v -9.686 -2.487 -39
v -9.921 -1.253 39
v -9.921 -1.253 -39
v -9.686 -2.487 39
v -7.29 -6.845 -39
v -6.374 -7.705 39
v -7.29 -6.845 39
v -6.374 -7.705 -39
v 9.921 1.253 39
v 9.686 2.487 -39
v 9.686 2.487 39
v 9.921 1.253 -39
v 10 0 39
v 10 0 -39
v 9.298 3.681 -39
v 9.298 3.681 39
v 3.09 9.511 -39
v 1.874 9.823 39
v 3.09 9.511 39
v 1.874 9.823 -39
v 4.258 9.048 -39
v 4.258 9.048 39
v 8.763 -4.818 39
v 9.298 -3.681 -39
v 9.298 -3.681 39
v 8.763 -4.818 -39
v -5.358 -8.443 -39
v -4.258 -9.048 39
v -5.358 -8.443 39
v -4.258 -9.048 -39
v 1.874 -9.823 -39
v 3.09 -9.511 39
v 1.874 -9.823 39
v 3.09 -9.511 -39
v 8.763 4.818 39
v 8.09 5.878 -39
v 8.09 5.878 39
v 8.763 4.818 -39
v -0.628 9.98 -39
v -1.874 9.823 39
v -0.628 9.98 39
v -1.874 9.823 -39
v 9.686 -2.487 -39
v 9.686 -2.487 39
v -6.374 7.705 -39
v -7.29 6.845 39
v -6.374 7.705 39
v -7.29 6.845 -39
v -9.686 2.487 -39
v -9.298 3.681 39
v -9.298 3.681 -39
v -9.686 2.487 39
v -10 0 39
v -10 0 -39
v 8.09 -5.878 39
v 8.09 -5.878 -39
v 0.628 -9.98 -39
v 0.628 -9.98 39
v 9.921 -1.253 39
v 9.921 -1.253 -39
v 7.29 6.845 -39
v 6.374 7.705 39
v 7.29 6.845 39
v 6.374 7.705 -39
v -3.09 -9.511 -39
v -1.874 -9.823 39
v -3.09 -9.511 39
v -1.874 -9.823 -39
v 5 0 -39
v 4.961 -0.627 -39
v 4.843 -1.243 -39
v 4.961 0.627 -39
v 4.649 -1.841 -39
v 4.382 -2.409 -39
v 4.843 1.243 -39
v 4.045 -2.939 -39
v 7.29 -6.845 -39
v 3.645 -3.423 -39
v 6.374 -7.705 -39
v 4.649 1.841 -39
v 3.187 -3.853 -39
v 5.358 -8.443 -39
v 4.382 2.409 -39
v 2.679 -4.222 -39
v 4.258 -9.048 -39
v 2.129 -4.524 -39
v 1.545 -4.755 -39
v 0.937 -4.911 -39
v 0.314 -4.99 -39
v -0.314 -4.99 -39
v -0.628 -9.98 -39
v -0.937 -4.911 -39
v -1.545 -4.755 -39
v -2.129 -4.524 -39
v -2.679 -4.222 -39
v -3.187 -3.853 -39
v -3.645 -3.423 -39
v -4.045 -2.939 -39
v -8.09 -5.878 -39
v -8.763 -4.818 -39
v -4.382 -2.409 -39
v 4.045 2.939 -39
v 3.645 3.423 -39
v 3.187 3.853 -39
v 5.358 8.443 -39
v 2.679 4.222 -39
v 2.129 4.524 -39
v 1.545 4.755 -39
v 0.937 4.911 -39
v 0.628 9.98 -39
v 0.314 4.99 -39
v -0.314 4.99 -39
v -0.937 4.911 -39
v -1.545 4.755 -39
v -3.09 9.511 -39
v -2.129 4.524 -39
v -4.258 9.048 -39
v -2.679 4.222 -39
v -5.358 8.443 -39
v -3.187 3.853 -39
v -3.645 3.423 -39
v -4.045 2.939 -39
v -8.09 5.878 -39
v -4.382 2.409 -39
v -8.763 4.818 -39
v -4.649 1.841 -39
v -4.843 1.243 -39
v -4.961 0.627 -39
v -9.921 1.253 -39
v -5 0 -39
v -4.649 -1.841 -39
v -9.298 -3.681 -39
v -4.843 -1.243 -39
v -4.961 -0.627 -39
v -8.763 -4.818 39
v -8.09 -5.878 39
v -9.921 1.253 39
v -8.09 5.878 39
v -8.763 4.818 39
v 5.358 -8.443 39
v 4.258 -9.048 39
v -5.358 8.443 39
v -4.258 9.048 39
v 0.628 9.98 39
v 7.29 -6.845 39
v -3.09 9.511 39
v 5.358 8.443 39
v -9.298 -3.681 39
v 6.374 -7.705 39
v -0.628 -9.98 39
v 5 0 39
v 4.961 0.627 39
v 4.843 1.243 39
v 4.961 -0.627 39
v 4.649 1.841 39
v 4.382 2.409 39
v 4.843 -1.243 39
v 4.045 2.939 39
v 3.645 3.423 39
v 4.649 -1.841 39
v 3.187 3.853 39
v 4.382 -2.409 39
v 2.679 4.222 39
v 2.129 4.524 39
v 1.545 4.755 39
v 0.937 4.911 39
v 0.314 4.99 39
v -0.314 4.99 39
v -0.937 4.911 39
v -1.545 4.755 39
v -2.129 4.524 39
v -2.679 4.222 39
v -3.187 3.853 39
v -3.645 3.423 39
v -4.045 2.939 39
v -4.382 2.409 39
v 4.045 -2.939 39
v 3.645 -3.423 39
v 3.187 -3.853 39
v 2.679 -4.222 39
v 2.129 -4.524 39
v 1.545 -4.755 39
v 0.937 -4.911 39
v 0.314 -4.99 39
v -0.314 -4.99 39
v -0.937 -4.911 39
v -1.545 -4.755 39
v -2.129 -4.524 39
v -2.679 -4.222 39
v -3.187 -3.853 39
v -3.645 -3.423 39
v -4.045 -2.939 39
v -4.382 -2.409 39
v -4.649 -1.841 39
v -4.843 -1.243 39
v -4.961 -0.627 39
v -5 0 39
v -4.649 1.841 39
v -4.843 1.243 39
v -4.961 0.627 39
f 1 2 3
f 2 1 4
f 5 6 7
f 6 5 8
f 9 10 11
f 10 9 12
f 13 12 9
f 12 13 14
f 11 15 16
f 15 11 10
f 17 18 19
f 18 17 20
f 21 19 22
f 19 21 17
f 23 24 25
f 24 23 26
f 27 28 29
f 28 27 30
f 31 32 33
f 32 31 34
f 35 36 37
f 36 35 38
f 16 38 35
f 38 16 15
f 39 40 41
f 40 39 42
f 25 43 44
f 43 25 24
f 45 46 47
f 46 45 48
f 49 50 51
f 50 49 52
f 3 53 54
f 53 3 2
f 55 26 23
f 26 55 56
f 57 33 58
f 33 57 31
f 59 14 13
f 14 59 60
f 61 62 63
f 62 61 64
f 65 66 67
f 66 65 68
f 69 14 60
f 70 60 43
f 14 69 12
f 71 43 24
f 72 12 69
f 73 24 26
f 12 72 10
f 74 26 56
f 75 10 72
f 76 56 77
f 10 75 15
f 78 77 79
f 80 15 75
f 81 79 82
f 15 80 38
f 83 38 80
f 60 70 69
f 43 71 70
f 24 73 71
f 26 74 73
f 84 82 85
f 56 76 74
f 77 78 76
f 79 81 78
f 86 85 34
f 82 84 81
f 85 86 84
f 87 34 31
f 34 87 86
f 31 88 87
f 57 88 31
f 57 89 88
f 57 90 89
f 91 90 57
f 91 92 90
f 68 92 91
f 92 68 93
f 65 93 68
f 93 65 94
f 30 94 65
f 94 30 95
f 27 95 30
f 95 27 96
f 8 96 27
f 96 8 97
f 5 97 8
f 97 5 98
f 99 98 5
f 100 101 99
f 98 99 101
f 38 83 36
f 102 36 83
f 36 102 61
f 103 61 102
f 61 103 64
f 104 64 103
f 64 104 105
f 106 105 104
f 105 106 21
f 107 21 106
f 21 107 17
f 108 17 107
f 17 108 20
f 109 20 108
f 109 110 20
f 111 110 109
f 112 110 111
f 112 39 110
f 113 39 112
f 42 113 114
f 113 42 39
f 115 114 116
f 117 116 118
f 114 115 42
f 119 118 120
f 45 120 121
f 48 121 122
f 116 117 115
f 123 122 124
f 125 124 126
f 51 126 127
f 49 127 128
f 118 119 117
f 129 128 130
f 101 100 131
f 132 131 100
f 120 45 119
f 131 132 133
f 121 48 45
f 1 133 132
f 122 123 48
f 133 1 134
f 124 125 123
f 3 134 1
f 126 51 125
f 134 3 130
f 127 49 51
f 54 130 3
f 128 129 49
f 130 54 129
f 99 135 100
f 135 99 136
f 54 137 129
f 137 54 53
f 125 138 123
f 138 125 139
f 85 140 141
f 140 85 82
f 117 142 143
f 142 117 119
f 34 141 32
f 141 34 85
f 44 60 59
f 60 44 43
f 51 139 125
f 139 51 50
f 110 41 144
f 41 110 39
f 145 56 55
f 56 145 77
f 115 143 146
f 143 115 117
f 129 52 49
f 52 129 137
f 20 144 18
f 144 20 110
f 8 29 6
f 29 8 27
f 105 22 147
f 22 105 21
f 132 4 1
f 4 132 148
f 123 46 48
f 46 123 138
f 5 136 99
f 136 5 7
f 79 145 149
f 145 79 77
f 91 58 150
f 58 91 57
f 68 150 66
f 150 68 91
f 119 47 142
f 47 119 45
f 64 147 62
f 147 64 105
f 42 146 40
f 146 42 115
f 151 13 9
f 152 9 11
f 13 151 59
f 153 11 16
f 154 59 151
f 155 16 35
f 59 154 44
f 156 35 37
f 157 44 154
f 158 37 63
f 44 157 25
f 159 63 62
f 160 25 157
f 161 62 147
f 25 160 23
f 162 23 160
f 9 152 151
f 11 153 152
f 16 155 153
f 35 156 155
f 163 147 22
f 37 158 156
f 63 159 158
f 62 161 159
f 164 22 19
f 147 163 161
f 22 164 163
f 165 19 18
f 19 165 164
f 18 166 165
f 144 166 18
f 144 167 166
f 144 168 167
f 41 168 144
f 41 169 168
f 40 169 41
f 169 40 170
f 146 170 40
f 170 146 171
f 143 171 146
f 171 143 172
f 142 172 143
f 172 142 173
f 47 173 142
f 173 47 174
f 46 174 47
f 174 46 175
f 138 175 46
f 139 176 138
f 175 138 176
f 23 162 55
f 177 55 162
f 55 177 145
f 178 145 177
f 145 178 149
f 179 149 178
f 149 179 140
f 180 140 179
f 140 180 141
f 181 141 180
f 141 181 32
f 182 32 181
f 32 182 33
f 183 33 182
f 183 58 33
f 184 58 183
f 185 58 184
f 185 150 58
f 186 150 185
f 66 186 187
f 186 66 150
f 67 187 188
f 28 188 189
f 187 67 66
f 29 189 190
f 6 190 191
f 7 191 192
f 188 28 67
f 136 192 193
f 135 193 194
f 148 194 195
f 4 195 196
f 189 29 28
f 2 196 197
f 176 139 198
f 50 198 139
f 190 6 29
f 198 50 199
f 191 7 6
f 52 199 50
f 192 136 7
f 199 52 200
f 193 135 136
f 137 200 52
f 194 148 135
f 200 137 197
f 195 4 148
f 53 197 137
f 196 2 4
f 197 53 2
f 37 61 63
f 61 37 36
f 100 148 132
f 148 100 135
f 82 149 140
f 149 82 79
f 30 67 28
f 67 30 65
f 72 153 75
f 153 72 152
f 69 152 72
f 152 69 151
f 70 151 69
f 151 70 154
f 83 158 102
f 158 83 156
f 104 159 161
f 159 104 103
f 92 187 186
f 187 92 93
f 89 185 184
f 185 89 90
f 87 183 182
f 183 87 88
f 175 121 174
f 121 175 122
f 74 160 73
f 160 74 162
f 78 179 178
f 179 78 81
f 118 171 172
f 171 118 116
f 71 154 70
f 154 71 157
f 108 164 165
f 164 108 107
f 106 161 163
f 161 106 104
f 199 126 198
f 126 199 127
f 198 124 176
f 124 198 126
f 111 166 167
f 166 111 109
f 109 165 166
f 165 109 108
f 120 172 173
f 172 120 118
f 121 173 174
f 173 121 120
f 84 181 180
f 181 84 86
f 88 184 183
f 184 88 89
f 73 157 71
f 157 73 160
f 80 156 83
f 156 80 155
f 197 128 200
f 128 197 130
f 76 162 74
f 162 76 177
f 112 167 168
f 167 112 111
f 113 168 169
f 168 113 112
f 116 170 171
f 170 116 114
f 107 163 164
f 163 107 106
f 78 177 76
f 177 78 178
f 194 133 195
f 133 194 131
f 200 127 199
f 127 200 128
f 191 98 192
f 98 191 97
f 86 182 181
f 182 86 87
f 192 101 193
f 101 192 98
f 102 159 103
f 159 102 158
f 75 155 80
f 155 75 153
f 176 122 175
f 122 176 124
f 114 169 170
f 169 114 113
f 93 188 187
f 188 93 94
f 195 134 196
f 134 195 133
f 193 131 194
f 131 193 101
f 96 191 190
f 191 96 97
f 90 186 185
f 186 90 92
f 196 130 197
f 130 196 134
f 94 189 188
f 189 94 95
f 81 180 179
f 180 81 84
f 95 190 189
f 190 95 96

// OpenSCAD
$fn = 50;


difference() {
	union() {
		translate(v = [0, 0, -39.0000000000]) {
			cylinder(h = 78, r = 10.0000000000);
		}
	}
	union() {
		translate(v = [0, 0, -100.0000000000]) {
			cylinder(h = 200, r = 5.0000000000);
		}
	}
}
